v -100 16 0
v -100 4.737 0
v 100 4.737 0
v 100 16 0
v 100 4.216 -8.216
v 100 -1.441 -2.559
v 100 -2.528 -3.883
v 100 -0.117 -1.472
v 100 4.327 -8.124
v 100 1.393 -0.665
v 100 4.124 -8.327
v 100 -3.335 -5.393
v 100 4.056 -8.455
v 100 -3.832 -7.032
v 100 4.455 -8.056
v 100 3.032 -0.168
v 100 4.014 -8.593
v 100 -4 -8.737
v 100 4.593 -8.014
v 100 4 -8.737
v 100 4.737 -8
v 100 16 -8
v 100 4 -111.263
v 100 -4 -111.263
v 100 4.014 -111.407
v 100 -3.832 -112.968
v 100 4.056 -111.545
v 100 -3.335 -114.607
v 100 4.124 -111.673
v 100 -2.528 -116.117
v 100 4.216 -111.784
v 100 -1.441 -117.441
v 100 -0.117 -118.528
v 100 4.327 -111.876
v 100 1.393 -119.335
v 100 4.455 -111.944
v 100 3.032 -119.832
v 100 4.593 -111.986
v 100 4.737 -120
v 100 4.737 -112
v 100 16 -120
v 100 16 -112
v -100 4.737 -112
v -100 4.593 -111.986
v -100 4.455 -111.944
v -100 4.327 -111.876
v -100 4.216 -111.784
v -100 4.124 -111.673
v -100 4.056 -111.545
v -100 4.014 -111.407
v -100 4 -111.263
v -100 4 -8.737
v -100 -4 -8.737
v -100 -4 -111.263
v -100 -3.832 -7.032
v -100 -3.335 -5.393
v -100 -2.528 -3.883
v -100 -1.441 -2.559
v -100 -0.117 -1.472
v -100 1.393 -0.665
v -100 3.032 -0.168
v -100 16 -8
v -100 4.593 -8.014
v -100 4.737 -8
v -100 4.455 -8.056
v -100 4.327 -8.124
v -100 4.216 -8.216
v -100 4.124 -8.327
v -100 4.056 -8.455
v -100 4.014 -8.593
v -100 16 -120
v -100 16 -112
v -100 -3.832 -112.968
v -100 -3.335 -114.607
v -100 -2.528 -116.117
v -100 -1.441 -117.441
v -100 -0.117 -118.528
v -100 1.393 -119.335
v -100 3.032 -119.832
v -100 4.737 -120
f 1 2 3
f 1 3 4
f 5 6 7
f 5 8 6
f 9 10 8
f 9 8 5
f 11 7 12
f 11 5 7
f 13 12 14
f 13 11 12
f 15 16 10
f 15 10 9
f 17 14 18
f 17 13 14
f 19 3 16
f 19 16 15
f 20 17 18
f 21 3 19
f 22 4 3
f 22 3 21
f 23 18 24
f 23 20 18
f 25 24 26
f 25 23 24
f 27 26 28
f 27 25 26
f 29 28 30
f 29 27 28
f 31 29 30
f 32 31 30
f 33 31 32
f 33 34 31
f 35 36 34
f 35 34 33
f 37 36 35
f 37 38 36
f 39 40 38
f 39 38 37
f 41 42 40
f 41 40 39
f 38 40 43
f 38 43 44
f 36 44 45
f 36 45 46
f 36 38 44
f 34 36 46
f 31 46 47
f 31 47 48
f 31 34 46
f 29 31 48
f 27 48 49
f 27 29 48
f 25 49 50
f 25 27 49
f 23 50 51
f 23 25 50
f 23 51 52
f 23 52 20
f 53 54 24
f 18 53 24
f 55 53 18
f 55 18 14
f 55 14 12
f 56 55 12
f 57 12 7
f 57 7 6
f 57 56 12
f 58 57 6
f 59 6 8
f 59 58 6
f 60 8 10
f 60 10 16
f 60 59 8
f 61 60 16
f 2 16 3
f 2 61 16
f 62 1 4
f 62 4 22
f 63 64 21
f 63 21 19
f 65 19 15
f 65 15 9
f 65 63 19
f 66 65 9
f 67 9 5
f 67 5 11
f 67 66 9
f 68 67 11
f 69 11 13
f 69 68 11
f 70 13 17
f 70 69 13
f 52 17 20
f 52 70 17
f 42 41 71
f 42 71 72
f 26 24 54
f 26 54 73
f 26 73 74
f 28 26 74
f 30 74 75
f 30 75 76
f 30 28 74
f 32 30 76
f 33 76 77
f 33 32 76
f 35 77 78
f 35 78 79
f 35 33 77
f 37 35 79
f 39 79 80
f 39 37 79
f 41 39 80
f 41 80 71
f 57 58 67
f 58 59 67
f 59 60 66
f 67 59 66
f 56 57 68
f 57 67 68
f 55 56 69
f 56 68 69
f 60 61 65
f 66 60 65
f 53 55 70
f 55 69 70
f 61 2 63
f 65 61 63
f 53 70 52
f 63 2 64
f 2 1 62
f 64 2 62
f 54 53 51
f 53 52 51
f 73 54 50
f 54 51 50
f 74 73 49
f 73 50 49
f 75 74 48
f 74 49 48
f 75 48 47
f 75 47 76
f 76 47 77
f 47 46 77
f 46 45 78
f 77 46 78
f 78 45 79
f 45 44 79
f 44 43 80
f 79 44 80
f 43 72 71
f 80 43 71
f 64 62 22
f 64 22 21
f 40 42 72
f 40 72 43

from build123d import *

# Parameters (mm, degrees)
SM_START                         = -4
SM_BASE_FLANGE_1_OUTLINE_W       = 200
SM_BASE_FLANGE_1_OUTLINE_H       = 120
SM_BASE_FLANGE_1_DEPTH           = 8
SM_EDGE_FLANGE_1_STRIP_W         = 33.4732
SM_EDGE_FLANGE_1_STRIP_H         = 8
SM_EDGE_FLANGE_1_STRIP_CUT_DEPTH = 200
SM_EDGE_FLANGE_1_DEPTH           = 200
SM_EDGE_FLANGE_2_STRIP_W         = 33.4732
SM_EDGE_FLANGE_2_STRIP_H         = 8
SM_EDGE_FLANGE_2_STRIP_CUT_DEPTH = 200
SM_EDGE_FLANGE_2_DEPTH           = 200


# Read off the part's stored shape, not the designer's step: 基体-法兰1
# Sheet-metal steps are written as plain solids
with BuildPart() as part:
    # 基体-法兰1 outline → 基体-法兰1 (new body)
    with BuildSketch(Plane(origin=(0, 0, 0), x_dir=(1, 0, 0), z_dir=(0, 1, 0)).offset(SM_START)):
        with Locations((0, 60)):
            Rectangle(SM_BASE_FLANGE_1_OUTLINE_W, SM_BASE_FLANGE_1_OUTLINE_H)
    extrude(amount=SM_BASE_FLANGE_1_DEPTH)

    # 边线-法兰1 strip (across the edge) → 边线-法兰1 strip cut (cut)
    with BuildSketch(Plane(origin=(-100, 4, 0), x_dir=(0, 0, -1), z_dir=(1, 0, 0))):
        with Locations((-8, -4)):
            Rectangle(SM_EDGE_FLANGE_1_STRIP_W, SM_EDGE_FLANGE_1_STRIP_H)
    extrude(amount=SM_EDGE_FLANGE_1_STRIP_CUT_DEPTH, mode=Mode.SUBTRACT)

    # 边线-法兰1 section (across the edge) → 边线-法兰1 (add)
    with BuildSketch(Plane(origin=(-100, 4, 0), x_dir=(0, 0, -1), z_dir=(1, 0, 0))):
        with BuildLine():
            Line((0, 0.7366), (0, 12))
            Line((0, 12), (8, 12))
            Line((8, 12), (8, 0.7366))
            ThreePointArc((8, 0.7366), (8.215745145, 0.215745145), (8.7366, 0))
            Line((8.7366, 0), (8.7366, -8))
            ThreePointArc((8.7366, -8), (2.558890895, -5.441109105), (0, 0.7366))
        make_face()
    extrude(amount=SM_EDGE_FLANGE_1_DEPTH)

    # 边线-法兰2 strip (across the edge) → 边线-法兰2 strip cut (cut)
    with BuildSketch(Plane(origin=(100, 4, -120), x_dir=(0, 0, 1), z_dir=(-1, 0, 0))):
        with Locations((-8, -4)):
            Rectangle(SM_EDGE_FLANGE_2_STRIP_W, SM_EDGE_FLANGE_2_STRIP_H)
    extrude(amount=SM_EDGE_FLANGE_2_STRIP_CUT_DEPTH, mode=Mode.SUBTRACT)

    # 边线-法兰2 section (across the edge) → 边线-法兰2 (add)
    with BuildSketch(Plane(origin=(100, 4, -120), x_dir=(0, 0, 1), z_dir=(-1, 0, 0))):
        with BuildLine():
            Line((0, 0.7366), (0, 12))
            Line((0, 12), (8, 12))
            Line((8, 12), (8, 0.7366))
            ThreePointArc((8, 0.7366), (8.215745145, 0.215745145), (8.7366, 0))
            Line((8.7366, 0), (8.7366, -8))
            ThreePointArc((8.7366, -8), (2.558890895, -5.441109105), (0, 0.7366))
        make_face()
    extrude(amount=SM_EDGE_FLANGE_2_DEPTH)


solid = part.part
